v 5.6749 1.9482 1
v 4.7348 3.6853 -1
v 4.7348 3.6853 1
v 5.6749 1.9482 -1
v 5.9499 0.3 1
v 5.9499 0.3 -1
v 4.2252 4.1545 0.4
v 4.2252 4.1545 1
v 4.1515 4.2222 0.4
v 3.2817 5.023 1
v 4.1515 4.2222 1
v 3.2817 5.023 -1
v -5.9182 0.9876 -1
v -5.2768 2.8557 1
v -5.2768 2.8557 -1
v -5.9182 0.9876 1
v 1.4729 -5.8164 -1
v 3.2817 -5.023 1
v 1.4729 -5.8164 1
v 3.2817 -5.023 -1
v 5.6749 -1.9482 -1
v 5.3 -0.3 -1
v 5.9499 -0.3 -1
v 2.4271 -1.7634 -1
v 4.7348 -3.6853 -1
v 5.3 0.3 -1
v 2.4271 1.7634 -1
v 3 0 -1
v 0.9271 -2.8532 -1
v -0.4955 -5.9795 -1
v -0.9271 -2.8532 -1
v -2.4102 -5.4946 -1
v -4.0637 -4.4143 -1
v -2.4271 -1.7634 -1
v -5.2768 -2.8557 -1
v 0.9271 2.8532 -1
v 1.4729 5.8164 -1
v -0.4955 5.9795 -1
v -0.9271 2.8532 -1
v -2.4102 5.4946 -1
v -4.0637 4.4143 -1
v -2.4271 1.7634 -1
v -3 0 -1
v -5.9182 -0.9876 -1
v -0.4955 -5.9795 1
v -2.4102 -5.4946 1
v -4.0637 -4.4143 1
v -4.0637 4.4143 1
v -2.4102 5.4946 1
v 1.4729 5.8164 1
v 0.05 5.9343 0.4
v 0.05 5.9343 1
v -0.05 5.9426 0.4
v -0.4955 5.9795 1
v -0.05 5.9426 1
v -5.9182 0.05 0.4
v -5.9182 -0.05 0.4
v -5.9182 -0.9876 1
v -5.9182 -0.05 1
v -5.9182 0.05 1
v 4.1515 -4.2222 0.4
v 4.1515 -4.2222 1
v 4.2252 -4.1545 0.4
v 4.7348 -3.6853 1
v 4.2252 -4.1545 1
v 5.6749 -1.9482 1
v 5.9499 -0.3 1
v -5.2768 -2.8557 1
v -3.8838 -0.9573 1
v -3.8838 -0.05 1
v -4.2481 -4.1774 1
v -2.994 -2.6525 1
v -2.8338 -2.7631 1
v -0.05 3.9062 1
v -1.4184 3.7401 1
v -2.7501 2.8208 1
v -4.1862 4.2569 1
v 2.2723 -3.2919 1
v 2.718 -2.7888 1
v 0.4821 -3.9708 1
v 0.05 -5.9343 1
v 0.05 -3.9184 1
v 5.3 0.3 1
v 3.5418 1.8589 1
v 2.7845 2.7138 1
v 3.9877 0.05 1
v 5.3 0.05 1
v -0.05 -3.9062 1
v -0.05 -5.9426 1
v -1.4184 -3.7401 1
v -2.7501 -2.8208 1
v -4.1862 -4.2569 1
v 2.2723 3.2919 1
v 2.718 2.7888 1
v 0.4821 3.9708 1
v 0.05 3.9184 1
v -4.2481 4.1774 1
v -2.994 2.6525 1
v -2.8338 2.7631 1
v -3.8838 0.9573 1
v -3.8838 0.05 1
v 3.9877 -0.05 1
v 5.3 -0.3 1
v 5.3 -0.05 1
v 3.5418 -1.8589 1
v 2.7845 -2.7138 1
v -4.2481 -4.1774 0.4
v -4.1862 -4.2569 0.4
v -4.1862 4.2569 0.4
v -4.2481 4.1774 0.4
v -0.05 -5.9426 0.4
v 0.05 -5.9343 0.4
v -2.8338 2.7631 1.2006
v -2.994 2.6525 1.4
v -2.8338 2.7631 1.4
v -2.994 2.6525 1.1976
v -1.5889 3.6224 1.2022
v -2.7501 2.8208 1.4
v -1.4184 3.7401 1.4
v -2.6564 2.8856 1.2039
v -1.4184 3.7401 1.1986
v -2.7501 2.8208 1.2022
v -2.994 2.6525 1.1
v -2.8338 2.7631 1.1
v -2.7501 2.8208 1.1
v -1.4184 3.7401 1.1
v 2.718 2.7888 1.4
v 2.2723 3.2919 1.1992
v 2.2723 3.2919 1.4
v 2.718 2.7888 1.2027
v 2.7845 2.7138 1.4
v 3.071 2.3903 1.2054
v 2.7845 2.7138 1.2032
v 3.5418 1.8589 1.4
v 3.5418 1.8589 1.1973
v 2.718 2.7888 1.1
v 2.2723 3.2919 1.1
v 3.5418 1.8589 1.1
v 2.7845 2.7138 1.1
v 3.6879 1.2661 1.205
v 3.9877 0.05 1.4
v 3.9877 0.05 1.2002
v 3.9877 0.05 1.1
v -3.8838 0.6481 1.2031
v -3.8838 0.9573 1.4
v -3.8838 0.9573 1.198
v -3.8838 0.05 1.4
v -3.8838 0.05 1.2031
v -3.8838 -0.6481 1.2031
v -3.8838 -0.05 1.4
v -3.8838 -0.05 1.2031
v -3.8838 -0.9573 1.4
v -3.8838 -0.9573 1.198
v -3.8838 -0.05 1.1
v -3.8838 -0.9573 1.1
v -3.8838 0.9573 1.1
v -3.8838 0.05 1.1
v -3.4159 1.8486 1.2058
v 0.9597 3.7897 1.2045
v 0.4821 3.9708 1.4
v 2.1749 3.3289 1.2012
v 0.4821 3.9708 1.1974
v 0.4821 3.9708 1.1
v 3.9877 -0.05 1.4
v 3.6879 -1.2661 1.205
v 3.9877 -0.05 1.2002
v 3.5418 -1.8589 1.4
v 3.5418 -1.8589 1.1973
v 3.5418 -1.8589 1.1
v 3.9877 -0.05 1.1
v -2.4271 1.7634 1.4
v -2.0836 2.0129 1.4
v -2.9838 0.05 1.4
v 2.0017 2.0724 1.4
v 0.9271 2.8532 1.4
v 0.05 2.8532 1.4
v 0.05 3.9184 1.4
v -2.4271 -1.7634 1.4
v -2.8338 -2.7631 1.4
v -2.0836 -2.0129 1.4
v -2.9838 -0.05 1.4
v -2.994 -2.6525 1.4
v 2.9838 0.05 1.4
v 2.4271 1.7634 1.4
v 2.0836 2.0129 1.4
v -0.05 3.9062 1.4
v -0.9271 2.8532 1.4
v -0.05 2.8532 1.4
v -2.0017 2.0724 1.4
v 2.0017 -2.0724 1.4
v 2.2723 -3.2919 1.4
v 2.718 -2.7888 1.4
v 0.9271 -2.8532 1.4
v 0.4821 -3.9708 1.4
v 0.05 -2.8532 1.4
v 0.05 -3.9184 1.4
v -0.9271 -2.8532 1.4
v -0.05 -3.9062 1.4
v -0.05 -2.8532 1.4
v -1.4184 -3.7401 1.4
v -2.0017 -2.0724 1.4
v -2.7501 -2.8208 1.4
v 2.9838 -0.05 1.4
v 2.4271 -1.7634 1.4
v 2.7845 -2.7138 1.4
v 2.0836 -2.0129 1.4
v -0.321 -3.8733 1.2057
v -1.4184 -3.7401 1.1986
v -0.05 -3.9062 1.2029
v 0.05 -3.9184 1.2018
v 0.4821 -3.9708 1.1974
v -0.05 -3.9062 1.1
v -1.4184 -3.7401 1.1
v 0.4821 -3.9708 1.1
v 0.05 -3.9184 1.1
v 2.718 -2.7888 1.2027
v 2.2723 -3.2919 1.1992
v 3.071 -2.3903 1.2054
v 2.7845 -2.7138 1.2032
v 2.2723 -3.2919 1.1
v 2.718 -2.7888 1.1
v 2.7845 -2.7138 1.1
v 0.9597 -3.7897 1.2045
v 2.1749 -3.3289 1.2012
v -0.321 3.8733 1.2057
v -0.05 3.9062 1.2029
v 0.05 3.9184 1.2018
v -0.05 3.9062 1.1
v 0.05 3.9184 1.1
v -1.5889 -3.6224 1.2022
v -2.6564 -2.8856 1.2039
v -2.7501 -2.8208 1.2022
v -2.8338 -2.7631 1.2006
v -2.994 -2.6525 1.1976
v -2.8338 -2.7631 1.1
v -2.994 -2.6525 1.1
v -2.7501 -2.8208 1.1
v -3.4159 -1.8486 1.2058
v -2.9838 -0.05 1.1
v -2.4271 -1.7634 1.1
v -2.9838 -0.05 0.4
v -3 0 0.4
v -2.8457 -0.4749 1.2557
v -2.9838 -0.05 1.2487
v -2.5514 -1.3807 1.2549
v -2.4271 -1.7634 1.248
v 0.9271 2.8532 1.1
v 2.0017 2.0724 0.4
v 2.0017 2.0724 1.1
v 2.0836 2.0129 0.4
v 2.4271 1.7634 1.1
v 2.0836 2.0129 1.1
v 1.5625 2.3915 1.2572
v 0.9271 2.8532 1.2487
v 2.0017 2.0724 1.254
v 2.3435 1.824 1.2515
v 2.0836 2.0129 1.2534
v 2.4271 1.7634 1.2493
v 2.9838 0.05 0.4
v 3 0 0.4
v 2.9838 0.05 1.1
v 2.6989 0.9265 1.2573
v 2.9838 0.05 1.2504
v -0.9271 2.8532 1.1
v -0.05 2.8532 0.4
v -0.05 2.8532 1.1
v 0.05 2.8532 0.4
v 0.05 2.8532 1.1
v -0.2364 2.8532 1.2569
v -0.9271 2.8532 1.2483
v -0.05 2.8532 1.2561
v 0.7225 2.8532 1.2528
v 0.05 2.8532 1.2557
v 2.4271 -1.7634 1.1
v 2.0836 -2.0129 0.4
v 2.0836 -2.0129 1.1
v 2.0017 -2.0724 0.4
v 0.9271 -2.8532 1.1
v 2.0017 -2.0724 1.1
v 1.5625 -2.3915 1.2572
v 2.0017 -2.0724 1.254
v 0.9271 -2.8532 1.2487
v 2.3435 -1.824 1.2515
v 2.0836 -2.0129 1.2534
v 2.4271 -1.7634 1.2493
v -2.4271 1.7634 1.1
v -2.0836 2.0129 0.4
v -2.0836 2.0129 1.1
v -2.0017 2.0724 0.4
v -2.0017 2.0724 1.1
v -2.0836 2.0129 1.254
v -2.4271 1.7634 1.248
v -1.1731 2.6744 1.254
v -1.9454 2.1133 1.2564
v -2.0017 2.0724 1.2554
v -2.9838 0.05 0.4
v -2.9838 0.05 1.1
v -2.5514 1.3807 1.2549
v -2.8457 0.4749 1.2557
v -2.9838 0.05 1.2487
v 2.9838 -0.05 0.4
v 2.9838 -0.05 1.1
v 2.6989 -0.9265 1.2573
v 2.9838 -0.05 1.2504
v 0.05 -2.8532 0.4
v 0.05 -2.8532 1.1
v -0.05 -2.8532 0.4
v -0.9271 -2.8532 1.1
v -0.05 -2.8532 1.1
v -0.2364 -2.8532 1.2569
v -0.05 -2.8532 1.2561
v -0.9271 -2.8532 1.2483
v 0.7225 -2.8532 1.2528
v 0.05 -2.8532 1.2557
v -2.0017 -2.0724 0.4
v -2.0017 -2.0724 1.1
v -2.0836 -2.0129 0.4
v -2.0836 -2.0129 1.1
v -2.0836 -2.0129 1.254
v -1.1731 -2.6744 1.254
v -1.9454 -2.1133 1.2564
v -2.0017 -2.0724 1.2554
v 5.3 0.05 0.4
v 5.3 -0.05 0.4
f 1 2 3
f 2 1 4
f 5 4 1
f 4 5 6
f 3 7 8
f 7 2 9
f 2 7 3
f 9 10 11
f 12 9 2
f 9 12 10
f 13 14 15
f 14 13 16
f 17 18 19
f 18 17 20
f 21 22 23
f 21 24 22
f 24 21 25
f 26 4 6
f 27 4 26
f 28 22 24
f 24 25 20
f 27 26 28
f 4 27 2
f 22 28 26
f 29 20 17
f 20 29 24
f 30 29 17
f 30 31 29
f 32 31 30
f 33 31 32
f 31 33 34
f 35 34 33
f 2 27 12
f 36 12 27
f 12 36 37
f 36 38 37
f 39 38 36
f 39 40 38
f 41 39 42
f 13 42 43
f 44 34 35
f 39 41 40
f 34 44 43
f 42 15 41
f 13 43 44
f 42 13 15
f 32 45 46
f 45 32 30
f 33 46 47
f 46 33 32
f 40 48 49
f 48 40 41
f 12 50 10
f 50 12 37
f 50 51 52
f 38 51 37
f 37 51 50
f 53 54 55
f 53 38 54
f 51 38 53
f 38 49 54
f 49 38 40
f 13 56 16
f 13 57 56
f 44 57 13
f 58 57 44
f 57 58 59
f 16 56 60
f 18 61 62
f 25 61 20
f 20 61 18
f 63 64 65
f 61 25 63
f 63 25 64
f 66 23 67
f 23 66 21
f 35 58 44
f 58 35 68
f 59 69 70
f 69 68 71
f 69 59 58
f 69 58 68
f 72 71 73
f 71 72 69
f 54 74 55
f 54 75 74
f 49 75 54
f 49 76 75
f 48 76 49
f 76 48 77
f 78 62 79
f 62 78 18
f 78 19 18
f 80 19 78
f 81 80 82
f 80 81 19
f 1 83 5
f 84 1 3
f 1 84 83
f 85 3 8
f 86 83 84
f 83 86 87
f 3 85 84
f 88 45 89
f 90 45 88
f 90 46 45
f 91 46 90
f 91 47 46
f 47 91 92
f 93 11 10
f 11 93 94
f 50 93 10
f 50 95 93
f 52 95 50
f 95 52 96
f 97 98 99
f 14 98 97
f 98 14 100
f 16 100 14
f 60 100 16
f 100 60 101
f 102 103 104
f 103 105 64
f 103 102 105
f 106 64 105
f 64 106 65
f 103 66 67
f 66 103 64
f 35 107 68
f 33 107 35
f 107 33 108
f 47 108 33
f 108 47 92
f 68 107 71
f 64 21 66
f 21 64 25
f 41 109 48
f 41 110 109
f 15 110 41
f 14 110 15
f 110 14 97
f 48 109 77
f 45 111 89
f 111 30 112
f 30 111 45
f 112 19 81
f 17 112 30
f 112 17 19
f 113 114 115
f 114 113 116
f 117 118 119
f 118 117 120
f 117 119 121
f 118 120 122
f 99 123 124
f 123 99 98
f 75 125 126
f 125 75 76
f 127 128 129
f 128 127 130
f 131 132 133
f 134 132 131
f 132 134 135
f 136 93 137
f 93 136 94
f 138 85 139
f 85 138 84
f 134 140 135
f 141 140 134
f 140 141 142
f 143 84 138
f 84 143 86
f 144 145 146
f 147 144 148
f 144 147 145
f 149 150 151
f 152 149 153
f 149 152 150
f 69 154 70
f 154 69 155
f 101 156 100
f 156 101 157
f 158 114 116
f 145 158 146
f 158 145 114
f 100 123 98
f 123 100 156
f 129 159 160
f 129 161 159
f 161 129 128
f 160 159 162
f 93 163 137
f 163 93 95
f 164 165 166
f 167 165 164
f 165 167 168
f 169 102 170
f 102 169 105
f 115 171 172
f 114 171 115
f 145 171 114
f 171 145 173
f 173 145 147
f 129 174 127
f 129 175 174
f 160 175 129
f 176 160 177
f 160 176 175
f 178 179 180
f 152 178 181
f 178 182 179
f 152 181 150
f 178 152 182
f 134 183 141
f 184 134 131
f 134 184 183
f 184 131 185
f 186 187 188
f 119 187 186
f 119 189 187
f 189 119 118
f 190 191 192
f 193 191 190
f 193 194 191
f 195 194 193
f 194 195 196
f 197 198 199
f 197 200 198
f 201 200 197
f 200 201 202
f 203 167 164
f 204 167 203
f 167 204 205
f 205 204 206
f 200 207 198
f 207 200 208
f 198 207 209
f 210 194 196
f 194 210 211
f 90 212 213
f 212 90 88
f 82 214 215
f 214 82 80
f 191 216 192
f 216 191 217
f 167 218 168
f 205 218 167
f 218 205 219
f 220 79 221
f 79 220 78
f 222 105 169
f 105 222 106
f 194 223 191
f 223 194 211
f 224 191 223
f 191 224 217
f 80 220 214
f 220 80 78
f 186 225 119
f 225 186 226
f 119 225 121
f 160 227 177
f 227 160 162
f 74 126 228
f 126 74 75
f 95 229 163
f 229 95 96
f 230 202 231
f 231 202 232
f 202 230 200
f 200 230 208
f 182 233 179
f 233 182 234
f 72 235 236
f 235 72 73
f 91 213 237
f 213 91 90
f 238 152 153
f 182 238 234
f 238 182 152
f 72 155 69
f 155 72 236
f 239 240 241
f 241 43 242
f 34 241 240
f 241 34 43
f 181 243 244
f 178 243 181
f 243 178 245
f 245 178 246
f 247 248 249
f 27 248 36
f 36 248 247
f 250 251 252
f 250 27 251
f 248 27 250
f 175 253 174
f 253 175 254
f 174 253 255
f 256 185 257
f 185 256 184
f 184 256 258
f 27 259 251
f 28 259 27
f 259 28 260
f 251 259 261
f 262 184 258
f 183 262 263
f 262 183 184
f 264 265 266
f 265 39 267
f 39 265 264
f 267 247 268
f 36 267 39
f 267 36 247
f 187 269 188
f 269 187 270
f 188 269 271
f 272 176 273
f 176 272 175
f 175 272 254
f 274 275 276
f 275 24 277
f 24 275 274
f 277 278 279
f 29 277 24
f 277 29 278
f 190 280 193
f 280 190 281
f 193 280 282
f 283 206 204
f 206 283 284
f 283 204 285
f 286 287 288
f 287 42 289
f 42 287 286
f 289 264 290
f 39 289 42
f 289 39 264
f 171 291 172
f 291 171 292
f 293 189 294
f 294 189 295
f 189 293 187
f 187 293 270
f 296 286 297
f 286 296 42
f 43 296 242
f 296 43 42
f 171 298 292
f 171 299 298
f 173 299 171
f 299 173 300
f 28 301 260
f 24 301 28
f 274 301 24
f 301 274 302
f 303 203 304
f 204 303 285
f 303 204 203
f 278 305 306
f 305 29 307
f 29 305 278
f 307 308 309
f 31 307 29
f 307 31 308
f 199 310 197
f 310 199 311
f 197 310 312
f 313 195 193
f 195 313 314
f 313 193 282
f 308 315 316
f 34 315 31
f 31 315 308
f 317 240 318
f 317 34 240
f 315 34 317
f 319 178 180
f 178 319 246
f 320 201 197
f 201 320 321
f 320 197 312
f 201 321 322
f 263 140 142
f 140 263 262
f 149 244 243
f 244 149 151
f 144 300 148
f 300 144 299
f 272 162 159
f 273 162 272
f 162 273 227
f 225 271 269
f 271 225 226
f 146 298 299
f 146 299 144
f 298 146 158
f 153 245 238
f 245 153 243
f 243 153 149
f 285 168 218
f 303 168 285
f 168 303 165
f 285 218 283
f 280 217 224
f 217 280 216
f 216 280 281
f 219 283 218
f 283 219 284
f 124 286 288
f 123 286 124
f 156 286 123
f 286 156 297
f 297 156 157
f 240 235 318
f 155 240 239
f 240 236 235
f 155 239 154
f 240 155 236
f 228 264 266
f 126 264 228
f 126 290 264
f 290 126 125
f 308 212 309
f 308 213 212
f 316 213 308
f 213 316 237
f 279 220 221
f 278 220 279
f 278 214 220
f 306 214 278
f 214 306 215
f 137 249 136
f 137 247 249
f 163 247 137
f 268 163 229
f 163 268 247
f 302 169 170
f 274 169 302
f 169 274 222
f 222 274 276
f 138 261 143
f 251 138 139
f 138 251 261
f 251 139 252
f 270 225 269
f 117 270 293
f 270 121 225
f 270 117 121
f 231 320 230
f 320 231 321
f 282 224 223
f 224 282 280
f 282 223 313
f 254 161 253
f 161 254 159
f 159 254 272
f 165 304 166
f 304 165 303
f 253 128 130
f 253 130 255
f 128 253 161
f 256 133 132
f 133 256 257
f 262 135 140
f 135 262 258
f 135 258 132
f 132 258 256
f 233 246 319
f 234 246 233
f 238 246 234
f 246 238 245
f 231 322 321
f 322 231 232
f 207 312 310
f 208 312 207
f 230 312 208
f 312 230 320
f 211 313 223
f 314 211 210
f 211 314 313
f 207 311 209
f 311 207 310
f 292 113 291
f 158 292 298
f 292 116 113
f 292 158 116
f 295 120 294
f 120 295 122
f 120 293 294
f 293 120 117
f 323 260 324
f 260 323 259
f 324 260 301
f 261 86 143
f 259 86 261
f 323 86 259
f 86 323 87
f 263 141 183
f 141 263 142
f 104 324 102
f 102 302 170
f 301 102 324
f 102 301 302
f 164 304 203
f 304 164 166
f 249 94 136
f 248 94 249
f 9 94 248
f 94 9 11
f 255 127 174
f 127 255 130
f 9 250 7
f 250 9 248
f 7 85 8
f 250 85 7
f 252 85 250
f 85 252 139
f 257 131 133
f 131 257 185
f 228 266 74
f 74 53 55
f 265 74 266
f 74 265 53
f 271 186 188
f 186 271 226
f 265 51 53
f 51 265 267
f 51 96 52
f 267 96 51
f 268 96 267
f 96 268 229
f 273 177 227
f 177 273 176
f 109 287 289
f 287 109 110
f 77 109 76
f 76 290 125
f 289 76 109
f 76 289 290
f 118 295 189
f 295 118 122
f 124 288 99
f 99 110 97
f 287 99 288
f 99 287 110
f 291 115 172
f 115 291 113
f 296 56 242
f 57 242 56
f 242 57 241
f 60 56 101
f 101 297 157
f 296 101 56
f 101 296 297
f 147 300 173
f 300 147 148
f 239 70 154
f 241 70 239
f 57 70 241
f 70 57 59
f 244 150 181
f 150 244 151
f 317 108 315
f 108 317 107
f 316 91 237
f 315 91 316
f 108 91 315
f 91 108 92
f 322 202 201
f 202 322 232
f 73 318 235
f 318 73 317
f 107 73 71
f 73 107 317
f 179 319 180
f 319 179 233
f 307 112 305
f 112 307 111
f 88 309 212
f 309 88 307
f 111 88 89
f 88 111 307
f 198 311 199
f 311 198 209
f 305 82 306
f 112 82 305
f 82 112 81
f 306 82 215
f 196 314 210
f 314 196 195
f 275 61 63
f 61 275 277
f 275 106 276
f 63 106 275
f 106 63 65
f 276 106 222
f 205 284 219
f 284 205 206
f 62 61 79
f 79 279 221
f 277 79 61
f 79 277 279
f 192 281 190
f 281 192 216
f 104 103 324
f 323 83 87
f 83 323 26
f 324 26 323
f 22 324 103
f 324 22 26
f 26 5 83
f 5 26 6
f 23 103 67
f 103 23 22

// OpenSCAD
// Parameters
outer_diameter = 12; //[6:24:0.5]
thickness = 2; //[1:4:0.1]
bore_diameter = 6; //[3:12:0.5]
pole_count = 8; //[2:24:1]
marker_depth = 0.2; //[0.05:0.6:0.05]
marker_gap = 0.1; //[0.05:0.5:0.05]
overlap = 0.8; //[0.2:2:0.1]
chamfer_size = 0.3; //[0.1:1:0.05]
hub_outer_diameter = 8; //[4:16:0.5]
hub_height = 1.2; //[0.5:3:0.1]
orientation_mark_width = 0.6; //[0.3:1.5:0.1]
orientation_mark_depth = 0.3; //[0.1:1:0.05]

// Base Shapes
module magnet_outer_cyl() {
  translate([0, 0, 0])
    cylinder(r=outer_diameter/2, h=thickness, center=true);
}

module center_bore_cyl() {
  translate([0, 0, 0])
    cylinder(r=bore_diameter/2, h=thickness + 2*overlap, center=true);
}

module mounting_hub_cyl() {
  translate([0, 0, thickness/2 + hub_height/2 - overlap])
    cylinder(r=hub_outer_diameter/2, h=hub_height, center=true);
}

module chamfer_top_cone_cut() {
  translate([0, 0, thickness/2 - chamfer_size/2 + overlap/2])
    cylinder(r1=outer_diameter/2, r2=0, h=chamfer_size, center=true);
}

module chamfer_bottom_cone_cut() {
  translate([0, 0, -thickness/2 + chamfer_size/2 - overlap/2])
    cylinder(r1=outer_diameter/2, r2=0, h=chamfer_size, center=true);
}

module pole_marker_groove_base() {
  translate([(bore_diameter/2 + (outer_diameter/2 - bore_diameter/2)/2) - overlap, 0, thickness/2 - marker_depth/2 + overlap/2])
    cube([outer_diameter/2 - bore_diameter/2 + 2*overlap, marker_gap, marker_depth + 2*overlap], center=true);
}

module orientation_mark_cut() {
  translate([outer_diameter/2 - orientation_mark_depth/2 + overlap/2, 0, 0])
    cube([orientation_mark_depth + 2*overlap, orientation_mark_width, thickness + 2*overlap], center=true);
}

// Operations
module magnet_body_with_hub_union() {
  union() {
    magnet_outer_cyl();
    mounting_hub_cyl();
  }
}

module magnet_body_minus_bore() {
  difference() {
    magnet_body_with_hub_union();
    center_bore_cyl();
  }
}

module magnet_body_minus_chamfers() {
  difference() {
    magnet_body_minus_bore();
    chamfer_top_cone_cut();
    chamfer_bottom_cone_cut();
  }
}

module pole_segmentation_markers_union() {
  union() {
    for (i = [0:pole_count-1]) {
      rotate([0, 0, i*(360/pole_count)])
        pole_marker_groove_base();
    }
  }
}

module magnet_minus_pole_markers() {
  difference() {
    magnet_body_minus_chamfers();
    pole_segmentation_markers_union();
  }
}

module magnet_complete_with_orientation_mark() {
  difference() {
    magnet_minus_pole_markers();
    orientation_mark_cut();
  }
}

// Final Output
magnet_complete_with_orientation_mark();
